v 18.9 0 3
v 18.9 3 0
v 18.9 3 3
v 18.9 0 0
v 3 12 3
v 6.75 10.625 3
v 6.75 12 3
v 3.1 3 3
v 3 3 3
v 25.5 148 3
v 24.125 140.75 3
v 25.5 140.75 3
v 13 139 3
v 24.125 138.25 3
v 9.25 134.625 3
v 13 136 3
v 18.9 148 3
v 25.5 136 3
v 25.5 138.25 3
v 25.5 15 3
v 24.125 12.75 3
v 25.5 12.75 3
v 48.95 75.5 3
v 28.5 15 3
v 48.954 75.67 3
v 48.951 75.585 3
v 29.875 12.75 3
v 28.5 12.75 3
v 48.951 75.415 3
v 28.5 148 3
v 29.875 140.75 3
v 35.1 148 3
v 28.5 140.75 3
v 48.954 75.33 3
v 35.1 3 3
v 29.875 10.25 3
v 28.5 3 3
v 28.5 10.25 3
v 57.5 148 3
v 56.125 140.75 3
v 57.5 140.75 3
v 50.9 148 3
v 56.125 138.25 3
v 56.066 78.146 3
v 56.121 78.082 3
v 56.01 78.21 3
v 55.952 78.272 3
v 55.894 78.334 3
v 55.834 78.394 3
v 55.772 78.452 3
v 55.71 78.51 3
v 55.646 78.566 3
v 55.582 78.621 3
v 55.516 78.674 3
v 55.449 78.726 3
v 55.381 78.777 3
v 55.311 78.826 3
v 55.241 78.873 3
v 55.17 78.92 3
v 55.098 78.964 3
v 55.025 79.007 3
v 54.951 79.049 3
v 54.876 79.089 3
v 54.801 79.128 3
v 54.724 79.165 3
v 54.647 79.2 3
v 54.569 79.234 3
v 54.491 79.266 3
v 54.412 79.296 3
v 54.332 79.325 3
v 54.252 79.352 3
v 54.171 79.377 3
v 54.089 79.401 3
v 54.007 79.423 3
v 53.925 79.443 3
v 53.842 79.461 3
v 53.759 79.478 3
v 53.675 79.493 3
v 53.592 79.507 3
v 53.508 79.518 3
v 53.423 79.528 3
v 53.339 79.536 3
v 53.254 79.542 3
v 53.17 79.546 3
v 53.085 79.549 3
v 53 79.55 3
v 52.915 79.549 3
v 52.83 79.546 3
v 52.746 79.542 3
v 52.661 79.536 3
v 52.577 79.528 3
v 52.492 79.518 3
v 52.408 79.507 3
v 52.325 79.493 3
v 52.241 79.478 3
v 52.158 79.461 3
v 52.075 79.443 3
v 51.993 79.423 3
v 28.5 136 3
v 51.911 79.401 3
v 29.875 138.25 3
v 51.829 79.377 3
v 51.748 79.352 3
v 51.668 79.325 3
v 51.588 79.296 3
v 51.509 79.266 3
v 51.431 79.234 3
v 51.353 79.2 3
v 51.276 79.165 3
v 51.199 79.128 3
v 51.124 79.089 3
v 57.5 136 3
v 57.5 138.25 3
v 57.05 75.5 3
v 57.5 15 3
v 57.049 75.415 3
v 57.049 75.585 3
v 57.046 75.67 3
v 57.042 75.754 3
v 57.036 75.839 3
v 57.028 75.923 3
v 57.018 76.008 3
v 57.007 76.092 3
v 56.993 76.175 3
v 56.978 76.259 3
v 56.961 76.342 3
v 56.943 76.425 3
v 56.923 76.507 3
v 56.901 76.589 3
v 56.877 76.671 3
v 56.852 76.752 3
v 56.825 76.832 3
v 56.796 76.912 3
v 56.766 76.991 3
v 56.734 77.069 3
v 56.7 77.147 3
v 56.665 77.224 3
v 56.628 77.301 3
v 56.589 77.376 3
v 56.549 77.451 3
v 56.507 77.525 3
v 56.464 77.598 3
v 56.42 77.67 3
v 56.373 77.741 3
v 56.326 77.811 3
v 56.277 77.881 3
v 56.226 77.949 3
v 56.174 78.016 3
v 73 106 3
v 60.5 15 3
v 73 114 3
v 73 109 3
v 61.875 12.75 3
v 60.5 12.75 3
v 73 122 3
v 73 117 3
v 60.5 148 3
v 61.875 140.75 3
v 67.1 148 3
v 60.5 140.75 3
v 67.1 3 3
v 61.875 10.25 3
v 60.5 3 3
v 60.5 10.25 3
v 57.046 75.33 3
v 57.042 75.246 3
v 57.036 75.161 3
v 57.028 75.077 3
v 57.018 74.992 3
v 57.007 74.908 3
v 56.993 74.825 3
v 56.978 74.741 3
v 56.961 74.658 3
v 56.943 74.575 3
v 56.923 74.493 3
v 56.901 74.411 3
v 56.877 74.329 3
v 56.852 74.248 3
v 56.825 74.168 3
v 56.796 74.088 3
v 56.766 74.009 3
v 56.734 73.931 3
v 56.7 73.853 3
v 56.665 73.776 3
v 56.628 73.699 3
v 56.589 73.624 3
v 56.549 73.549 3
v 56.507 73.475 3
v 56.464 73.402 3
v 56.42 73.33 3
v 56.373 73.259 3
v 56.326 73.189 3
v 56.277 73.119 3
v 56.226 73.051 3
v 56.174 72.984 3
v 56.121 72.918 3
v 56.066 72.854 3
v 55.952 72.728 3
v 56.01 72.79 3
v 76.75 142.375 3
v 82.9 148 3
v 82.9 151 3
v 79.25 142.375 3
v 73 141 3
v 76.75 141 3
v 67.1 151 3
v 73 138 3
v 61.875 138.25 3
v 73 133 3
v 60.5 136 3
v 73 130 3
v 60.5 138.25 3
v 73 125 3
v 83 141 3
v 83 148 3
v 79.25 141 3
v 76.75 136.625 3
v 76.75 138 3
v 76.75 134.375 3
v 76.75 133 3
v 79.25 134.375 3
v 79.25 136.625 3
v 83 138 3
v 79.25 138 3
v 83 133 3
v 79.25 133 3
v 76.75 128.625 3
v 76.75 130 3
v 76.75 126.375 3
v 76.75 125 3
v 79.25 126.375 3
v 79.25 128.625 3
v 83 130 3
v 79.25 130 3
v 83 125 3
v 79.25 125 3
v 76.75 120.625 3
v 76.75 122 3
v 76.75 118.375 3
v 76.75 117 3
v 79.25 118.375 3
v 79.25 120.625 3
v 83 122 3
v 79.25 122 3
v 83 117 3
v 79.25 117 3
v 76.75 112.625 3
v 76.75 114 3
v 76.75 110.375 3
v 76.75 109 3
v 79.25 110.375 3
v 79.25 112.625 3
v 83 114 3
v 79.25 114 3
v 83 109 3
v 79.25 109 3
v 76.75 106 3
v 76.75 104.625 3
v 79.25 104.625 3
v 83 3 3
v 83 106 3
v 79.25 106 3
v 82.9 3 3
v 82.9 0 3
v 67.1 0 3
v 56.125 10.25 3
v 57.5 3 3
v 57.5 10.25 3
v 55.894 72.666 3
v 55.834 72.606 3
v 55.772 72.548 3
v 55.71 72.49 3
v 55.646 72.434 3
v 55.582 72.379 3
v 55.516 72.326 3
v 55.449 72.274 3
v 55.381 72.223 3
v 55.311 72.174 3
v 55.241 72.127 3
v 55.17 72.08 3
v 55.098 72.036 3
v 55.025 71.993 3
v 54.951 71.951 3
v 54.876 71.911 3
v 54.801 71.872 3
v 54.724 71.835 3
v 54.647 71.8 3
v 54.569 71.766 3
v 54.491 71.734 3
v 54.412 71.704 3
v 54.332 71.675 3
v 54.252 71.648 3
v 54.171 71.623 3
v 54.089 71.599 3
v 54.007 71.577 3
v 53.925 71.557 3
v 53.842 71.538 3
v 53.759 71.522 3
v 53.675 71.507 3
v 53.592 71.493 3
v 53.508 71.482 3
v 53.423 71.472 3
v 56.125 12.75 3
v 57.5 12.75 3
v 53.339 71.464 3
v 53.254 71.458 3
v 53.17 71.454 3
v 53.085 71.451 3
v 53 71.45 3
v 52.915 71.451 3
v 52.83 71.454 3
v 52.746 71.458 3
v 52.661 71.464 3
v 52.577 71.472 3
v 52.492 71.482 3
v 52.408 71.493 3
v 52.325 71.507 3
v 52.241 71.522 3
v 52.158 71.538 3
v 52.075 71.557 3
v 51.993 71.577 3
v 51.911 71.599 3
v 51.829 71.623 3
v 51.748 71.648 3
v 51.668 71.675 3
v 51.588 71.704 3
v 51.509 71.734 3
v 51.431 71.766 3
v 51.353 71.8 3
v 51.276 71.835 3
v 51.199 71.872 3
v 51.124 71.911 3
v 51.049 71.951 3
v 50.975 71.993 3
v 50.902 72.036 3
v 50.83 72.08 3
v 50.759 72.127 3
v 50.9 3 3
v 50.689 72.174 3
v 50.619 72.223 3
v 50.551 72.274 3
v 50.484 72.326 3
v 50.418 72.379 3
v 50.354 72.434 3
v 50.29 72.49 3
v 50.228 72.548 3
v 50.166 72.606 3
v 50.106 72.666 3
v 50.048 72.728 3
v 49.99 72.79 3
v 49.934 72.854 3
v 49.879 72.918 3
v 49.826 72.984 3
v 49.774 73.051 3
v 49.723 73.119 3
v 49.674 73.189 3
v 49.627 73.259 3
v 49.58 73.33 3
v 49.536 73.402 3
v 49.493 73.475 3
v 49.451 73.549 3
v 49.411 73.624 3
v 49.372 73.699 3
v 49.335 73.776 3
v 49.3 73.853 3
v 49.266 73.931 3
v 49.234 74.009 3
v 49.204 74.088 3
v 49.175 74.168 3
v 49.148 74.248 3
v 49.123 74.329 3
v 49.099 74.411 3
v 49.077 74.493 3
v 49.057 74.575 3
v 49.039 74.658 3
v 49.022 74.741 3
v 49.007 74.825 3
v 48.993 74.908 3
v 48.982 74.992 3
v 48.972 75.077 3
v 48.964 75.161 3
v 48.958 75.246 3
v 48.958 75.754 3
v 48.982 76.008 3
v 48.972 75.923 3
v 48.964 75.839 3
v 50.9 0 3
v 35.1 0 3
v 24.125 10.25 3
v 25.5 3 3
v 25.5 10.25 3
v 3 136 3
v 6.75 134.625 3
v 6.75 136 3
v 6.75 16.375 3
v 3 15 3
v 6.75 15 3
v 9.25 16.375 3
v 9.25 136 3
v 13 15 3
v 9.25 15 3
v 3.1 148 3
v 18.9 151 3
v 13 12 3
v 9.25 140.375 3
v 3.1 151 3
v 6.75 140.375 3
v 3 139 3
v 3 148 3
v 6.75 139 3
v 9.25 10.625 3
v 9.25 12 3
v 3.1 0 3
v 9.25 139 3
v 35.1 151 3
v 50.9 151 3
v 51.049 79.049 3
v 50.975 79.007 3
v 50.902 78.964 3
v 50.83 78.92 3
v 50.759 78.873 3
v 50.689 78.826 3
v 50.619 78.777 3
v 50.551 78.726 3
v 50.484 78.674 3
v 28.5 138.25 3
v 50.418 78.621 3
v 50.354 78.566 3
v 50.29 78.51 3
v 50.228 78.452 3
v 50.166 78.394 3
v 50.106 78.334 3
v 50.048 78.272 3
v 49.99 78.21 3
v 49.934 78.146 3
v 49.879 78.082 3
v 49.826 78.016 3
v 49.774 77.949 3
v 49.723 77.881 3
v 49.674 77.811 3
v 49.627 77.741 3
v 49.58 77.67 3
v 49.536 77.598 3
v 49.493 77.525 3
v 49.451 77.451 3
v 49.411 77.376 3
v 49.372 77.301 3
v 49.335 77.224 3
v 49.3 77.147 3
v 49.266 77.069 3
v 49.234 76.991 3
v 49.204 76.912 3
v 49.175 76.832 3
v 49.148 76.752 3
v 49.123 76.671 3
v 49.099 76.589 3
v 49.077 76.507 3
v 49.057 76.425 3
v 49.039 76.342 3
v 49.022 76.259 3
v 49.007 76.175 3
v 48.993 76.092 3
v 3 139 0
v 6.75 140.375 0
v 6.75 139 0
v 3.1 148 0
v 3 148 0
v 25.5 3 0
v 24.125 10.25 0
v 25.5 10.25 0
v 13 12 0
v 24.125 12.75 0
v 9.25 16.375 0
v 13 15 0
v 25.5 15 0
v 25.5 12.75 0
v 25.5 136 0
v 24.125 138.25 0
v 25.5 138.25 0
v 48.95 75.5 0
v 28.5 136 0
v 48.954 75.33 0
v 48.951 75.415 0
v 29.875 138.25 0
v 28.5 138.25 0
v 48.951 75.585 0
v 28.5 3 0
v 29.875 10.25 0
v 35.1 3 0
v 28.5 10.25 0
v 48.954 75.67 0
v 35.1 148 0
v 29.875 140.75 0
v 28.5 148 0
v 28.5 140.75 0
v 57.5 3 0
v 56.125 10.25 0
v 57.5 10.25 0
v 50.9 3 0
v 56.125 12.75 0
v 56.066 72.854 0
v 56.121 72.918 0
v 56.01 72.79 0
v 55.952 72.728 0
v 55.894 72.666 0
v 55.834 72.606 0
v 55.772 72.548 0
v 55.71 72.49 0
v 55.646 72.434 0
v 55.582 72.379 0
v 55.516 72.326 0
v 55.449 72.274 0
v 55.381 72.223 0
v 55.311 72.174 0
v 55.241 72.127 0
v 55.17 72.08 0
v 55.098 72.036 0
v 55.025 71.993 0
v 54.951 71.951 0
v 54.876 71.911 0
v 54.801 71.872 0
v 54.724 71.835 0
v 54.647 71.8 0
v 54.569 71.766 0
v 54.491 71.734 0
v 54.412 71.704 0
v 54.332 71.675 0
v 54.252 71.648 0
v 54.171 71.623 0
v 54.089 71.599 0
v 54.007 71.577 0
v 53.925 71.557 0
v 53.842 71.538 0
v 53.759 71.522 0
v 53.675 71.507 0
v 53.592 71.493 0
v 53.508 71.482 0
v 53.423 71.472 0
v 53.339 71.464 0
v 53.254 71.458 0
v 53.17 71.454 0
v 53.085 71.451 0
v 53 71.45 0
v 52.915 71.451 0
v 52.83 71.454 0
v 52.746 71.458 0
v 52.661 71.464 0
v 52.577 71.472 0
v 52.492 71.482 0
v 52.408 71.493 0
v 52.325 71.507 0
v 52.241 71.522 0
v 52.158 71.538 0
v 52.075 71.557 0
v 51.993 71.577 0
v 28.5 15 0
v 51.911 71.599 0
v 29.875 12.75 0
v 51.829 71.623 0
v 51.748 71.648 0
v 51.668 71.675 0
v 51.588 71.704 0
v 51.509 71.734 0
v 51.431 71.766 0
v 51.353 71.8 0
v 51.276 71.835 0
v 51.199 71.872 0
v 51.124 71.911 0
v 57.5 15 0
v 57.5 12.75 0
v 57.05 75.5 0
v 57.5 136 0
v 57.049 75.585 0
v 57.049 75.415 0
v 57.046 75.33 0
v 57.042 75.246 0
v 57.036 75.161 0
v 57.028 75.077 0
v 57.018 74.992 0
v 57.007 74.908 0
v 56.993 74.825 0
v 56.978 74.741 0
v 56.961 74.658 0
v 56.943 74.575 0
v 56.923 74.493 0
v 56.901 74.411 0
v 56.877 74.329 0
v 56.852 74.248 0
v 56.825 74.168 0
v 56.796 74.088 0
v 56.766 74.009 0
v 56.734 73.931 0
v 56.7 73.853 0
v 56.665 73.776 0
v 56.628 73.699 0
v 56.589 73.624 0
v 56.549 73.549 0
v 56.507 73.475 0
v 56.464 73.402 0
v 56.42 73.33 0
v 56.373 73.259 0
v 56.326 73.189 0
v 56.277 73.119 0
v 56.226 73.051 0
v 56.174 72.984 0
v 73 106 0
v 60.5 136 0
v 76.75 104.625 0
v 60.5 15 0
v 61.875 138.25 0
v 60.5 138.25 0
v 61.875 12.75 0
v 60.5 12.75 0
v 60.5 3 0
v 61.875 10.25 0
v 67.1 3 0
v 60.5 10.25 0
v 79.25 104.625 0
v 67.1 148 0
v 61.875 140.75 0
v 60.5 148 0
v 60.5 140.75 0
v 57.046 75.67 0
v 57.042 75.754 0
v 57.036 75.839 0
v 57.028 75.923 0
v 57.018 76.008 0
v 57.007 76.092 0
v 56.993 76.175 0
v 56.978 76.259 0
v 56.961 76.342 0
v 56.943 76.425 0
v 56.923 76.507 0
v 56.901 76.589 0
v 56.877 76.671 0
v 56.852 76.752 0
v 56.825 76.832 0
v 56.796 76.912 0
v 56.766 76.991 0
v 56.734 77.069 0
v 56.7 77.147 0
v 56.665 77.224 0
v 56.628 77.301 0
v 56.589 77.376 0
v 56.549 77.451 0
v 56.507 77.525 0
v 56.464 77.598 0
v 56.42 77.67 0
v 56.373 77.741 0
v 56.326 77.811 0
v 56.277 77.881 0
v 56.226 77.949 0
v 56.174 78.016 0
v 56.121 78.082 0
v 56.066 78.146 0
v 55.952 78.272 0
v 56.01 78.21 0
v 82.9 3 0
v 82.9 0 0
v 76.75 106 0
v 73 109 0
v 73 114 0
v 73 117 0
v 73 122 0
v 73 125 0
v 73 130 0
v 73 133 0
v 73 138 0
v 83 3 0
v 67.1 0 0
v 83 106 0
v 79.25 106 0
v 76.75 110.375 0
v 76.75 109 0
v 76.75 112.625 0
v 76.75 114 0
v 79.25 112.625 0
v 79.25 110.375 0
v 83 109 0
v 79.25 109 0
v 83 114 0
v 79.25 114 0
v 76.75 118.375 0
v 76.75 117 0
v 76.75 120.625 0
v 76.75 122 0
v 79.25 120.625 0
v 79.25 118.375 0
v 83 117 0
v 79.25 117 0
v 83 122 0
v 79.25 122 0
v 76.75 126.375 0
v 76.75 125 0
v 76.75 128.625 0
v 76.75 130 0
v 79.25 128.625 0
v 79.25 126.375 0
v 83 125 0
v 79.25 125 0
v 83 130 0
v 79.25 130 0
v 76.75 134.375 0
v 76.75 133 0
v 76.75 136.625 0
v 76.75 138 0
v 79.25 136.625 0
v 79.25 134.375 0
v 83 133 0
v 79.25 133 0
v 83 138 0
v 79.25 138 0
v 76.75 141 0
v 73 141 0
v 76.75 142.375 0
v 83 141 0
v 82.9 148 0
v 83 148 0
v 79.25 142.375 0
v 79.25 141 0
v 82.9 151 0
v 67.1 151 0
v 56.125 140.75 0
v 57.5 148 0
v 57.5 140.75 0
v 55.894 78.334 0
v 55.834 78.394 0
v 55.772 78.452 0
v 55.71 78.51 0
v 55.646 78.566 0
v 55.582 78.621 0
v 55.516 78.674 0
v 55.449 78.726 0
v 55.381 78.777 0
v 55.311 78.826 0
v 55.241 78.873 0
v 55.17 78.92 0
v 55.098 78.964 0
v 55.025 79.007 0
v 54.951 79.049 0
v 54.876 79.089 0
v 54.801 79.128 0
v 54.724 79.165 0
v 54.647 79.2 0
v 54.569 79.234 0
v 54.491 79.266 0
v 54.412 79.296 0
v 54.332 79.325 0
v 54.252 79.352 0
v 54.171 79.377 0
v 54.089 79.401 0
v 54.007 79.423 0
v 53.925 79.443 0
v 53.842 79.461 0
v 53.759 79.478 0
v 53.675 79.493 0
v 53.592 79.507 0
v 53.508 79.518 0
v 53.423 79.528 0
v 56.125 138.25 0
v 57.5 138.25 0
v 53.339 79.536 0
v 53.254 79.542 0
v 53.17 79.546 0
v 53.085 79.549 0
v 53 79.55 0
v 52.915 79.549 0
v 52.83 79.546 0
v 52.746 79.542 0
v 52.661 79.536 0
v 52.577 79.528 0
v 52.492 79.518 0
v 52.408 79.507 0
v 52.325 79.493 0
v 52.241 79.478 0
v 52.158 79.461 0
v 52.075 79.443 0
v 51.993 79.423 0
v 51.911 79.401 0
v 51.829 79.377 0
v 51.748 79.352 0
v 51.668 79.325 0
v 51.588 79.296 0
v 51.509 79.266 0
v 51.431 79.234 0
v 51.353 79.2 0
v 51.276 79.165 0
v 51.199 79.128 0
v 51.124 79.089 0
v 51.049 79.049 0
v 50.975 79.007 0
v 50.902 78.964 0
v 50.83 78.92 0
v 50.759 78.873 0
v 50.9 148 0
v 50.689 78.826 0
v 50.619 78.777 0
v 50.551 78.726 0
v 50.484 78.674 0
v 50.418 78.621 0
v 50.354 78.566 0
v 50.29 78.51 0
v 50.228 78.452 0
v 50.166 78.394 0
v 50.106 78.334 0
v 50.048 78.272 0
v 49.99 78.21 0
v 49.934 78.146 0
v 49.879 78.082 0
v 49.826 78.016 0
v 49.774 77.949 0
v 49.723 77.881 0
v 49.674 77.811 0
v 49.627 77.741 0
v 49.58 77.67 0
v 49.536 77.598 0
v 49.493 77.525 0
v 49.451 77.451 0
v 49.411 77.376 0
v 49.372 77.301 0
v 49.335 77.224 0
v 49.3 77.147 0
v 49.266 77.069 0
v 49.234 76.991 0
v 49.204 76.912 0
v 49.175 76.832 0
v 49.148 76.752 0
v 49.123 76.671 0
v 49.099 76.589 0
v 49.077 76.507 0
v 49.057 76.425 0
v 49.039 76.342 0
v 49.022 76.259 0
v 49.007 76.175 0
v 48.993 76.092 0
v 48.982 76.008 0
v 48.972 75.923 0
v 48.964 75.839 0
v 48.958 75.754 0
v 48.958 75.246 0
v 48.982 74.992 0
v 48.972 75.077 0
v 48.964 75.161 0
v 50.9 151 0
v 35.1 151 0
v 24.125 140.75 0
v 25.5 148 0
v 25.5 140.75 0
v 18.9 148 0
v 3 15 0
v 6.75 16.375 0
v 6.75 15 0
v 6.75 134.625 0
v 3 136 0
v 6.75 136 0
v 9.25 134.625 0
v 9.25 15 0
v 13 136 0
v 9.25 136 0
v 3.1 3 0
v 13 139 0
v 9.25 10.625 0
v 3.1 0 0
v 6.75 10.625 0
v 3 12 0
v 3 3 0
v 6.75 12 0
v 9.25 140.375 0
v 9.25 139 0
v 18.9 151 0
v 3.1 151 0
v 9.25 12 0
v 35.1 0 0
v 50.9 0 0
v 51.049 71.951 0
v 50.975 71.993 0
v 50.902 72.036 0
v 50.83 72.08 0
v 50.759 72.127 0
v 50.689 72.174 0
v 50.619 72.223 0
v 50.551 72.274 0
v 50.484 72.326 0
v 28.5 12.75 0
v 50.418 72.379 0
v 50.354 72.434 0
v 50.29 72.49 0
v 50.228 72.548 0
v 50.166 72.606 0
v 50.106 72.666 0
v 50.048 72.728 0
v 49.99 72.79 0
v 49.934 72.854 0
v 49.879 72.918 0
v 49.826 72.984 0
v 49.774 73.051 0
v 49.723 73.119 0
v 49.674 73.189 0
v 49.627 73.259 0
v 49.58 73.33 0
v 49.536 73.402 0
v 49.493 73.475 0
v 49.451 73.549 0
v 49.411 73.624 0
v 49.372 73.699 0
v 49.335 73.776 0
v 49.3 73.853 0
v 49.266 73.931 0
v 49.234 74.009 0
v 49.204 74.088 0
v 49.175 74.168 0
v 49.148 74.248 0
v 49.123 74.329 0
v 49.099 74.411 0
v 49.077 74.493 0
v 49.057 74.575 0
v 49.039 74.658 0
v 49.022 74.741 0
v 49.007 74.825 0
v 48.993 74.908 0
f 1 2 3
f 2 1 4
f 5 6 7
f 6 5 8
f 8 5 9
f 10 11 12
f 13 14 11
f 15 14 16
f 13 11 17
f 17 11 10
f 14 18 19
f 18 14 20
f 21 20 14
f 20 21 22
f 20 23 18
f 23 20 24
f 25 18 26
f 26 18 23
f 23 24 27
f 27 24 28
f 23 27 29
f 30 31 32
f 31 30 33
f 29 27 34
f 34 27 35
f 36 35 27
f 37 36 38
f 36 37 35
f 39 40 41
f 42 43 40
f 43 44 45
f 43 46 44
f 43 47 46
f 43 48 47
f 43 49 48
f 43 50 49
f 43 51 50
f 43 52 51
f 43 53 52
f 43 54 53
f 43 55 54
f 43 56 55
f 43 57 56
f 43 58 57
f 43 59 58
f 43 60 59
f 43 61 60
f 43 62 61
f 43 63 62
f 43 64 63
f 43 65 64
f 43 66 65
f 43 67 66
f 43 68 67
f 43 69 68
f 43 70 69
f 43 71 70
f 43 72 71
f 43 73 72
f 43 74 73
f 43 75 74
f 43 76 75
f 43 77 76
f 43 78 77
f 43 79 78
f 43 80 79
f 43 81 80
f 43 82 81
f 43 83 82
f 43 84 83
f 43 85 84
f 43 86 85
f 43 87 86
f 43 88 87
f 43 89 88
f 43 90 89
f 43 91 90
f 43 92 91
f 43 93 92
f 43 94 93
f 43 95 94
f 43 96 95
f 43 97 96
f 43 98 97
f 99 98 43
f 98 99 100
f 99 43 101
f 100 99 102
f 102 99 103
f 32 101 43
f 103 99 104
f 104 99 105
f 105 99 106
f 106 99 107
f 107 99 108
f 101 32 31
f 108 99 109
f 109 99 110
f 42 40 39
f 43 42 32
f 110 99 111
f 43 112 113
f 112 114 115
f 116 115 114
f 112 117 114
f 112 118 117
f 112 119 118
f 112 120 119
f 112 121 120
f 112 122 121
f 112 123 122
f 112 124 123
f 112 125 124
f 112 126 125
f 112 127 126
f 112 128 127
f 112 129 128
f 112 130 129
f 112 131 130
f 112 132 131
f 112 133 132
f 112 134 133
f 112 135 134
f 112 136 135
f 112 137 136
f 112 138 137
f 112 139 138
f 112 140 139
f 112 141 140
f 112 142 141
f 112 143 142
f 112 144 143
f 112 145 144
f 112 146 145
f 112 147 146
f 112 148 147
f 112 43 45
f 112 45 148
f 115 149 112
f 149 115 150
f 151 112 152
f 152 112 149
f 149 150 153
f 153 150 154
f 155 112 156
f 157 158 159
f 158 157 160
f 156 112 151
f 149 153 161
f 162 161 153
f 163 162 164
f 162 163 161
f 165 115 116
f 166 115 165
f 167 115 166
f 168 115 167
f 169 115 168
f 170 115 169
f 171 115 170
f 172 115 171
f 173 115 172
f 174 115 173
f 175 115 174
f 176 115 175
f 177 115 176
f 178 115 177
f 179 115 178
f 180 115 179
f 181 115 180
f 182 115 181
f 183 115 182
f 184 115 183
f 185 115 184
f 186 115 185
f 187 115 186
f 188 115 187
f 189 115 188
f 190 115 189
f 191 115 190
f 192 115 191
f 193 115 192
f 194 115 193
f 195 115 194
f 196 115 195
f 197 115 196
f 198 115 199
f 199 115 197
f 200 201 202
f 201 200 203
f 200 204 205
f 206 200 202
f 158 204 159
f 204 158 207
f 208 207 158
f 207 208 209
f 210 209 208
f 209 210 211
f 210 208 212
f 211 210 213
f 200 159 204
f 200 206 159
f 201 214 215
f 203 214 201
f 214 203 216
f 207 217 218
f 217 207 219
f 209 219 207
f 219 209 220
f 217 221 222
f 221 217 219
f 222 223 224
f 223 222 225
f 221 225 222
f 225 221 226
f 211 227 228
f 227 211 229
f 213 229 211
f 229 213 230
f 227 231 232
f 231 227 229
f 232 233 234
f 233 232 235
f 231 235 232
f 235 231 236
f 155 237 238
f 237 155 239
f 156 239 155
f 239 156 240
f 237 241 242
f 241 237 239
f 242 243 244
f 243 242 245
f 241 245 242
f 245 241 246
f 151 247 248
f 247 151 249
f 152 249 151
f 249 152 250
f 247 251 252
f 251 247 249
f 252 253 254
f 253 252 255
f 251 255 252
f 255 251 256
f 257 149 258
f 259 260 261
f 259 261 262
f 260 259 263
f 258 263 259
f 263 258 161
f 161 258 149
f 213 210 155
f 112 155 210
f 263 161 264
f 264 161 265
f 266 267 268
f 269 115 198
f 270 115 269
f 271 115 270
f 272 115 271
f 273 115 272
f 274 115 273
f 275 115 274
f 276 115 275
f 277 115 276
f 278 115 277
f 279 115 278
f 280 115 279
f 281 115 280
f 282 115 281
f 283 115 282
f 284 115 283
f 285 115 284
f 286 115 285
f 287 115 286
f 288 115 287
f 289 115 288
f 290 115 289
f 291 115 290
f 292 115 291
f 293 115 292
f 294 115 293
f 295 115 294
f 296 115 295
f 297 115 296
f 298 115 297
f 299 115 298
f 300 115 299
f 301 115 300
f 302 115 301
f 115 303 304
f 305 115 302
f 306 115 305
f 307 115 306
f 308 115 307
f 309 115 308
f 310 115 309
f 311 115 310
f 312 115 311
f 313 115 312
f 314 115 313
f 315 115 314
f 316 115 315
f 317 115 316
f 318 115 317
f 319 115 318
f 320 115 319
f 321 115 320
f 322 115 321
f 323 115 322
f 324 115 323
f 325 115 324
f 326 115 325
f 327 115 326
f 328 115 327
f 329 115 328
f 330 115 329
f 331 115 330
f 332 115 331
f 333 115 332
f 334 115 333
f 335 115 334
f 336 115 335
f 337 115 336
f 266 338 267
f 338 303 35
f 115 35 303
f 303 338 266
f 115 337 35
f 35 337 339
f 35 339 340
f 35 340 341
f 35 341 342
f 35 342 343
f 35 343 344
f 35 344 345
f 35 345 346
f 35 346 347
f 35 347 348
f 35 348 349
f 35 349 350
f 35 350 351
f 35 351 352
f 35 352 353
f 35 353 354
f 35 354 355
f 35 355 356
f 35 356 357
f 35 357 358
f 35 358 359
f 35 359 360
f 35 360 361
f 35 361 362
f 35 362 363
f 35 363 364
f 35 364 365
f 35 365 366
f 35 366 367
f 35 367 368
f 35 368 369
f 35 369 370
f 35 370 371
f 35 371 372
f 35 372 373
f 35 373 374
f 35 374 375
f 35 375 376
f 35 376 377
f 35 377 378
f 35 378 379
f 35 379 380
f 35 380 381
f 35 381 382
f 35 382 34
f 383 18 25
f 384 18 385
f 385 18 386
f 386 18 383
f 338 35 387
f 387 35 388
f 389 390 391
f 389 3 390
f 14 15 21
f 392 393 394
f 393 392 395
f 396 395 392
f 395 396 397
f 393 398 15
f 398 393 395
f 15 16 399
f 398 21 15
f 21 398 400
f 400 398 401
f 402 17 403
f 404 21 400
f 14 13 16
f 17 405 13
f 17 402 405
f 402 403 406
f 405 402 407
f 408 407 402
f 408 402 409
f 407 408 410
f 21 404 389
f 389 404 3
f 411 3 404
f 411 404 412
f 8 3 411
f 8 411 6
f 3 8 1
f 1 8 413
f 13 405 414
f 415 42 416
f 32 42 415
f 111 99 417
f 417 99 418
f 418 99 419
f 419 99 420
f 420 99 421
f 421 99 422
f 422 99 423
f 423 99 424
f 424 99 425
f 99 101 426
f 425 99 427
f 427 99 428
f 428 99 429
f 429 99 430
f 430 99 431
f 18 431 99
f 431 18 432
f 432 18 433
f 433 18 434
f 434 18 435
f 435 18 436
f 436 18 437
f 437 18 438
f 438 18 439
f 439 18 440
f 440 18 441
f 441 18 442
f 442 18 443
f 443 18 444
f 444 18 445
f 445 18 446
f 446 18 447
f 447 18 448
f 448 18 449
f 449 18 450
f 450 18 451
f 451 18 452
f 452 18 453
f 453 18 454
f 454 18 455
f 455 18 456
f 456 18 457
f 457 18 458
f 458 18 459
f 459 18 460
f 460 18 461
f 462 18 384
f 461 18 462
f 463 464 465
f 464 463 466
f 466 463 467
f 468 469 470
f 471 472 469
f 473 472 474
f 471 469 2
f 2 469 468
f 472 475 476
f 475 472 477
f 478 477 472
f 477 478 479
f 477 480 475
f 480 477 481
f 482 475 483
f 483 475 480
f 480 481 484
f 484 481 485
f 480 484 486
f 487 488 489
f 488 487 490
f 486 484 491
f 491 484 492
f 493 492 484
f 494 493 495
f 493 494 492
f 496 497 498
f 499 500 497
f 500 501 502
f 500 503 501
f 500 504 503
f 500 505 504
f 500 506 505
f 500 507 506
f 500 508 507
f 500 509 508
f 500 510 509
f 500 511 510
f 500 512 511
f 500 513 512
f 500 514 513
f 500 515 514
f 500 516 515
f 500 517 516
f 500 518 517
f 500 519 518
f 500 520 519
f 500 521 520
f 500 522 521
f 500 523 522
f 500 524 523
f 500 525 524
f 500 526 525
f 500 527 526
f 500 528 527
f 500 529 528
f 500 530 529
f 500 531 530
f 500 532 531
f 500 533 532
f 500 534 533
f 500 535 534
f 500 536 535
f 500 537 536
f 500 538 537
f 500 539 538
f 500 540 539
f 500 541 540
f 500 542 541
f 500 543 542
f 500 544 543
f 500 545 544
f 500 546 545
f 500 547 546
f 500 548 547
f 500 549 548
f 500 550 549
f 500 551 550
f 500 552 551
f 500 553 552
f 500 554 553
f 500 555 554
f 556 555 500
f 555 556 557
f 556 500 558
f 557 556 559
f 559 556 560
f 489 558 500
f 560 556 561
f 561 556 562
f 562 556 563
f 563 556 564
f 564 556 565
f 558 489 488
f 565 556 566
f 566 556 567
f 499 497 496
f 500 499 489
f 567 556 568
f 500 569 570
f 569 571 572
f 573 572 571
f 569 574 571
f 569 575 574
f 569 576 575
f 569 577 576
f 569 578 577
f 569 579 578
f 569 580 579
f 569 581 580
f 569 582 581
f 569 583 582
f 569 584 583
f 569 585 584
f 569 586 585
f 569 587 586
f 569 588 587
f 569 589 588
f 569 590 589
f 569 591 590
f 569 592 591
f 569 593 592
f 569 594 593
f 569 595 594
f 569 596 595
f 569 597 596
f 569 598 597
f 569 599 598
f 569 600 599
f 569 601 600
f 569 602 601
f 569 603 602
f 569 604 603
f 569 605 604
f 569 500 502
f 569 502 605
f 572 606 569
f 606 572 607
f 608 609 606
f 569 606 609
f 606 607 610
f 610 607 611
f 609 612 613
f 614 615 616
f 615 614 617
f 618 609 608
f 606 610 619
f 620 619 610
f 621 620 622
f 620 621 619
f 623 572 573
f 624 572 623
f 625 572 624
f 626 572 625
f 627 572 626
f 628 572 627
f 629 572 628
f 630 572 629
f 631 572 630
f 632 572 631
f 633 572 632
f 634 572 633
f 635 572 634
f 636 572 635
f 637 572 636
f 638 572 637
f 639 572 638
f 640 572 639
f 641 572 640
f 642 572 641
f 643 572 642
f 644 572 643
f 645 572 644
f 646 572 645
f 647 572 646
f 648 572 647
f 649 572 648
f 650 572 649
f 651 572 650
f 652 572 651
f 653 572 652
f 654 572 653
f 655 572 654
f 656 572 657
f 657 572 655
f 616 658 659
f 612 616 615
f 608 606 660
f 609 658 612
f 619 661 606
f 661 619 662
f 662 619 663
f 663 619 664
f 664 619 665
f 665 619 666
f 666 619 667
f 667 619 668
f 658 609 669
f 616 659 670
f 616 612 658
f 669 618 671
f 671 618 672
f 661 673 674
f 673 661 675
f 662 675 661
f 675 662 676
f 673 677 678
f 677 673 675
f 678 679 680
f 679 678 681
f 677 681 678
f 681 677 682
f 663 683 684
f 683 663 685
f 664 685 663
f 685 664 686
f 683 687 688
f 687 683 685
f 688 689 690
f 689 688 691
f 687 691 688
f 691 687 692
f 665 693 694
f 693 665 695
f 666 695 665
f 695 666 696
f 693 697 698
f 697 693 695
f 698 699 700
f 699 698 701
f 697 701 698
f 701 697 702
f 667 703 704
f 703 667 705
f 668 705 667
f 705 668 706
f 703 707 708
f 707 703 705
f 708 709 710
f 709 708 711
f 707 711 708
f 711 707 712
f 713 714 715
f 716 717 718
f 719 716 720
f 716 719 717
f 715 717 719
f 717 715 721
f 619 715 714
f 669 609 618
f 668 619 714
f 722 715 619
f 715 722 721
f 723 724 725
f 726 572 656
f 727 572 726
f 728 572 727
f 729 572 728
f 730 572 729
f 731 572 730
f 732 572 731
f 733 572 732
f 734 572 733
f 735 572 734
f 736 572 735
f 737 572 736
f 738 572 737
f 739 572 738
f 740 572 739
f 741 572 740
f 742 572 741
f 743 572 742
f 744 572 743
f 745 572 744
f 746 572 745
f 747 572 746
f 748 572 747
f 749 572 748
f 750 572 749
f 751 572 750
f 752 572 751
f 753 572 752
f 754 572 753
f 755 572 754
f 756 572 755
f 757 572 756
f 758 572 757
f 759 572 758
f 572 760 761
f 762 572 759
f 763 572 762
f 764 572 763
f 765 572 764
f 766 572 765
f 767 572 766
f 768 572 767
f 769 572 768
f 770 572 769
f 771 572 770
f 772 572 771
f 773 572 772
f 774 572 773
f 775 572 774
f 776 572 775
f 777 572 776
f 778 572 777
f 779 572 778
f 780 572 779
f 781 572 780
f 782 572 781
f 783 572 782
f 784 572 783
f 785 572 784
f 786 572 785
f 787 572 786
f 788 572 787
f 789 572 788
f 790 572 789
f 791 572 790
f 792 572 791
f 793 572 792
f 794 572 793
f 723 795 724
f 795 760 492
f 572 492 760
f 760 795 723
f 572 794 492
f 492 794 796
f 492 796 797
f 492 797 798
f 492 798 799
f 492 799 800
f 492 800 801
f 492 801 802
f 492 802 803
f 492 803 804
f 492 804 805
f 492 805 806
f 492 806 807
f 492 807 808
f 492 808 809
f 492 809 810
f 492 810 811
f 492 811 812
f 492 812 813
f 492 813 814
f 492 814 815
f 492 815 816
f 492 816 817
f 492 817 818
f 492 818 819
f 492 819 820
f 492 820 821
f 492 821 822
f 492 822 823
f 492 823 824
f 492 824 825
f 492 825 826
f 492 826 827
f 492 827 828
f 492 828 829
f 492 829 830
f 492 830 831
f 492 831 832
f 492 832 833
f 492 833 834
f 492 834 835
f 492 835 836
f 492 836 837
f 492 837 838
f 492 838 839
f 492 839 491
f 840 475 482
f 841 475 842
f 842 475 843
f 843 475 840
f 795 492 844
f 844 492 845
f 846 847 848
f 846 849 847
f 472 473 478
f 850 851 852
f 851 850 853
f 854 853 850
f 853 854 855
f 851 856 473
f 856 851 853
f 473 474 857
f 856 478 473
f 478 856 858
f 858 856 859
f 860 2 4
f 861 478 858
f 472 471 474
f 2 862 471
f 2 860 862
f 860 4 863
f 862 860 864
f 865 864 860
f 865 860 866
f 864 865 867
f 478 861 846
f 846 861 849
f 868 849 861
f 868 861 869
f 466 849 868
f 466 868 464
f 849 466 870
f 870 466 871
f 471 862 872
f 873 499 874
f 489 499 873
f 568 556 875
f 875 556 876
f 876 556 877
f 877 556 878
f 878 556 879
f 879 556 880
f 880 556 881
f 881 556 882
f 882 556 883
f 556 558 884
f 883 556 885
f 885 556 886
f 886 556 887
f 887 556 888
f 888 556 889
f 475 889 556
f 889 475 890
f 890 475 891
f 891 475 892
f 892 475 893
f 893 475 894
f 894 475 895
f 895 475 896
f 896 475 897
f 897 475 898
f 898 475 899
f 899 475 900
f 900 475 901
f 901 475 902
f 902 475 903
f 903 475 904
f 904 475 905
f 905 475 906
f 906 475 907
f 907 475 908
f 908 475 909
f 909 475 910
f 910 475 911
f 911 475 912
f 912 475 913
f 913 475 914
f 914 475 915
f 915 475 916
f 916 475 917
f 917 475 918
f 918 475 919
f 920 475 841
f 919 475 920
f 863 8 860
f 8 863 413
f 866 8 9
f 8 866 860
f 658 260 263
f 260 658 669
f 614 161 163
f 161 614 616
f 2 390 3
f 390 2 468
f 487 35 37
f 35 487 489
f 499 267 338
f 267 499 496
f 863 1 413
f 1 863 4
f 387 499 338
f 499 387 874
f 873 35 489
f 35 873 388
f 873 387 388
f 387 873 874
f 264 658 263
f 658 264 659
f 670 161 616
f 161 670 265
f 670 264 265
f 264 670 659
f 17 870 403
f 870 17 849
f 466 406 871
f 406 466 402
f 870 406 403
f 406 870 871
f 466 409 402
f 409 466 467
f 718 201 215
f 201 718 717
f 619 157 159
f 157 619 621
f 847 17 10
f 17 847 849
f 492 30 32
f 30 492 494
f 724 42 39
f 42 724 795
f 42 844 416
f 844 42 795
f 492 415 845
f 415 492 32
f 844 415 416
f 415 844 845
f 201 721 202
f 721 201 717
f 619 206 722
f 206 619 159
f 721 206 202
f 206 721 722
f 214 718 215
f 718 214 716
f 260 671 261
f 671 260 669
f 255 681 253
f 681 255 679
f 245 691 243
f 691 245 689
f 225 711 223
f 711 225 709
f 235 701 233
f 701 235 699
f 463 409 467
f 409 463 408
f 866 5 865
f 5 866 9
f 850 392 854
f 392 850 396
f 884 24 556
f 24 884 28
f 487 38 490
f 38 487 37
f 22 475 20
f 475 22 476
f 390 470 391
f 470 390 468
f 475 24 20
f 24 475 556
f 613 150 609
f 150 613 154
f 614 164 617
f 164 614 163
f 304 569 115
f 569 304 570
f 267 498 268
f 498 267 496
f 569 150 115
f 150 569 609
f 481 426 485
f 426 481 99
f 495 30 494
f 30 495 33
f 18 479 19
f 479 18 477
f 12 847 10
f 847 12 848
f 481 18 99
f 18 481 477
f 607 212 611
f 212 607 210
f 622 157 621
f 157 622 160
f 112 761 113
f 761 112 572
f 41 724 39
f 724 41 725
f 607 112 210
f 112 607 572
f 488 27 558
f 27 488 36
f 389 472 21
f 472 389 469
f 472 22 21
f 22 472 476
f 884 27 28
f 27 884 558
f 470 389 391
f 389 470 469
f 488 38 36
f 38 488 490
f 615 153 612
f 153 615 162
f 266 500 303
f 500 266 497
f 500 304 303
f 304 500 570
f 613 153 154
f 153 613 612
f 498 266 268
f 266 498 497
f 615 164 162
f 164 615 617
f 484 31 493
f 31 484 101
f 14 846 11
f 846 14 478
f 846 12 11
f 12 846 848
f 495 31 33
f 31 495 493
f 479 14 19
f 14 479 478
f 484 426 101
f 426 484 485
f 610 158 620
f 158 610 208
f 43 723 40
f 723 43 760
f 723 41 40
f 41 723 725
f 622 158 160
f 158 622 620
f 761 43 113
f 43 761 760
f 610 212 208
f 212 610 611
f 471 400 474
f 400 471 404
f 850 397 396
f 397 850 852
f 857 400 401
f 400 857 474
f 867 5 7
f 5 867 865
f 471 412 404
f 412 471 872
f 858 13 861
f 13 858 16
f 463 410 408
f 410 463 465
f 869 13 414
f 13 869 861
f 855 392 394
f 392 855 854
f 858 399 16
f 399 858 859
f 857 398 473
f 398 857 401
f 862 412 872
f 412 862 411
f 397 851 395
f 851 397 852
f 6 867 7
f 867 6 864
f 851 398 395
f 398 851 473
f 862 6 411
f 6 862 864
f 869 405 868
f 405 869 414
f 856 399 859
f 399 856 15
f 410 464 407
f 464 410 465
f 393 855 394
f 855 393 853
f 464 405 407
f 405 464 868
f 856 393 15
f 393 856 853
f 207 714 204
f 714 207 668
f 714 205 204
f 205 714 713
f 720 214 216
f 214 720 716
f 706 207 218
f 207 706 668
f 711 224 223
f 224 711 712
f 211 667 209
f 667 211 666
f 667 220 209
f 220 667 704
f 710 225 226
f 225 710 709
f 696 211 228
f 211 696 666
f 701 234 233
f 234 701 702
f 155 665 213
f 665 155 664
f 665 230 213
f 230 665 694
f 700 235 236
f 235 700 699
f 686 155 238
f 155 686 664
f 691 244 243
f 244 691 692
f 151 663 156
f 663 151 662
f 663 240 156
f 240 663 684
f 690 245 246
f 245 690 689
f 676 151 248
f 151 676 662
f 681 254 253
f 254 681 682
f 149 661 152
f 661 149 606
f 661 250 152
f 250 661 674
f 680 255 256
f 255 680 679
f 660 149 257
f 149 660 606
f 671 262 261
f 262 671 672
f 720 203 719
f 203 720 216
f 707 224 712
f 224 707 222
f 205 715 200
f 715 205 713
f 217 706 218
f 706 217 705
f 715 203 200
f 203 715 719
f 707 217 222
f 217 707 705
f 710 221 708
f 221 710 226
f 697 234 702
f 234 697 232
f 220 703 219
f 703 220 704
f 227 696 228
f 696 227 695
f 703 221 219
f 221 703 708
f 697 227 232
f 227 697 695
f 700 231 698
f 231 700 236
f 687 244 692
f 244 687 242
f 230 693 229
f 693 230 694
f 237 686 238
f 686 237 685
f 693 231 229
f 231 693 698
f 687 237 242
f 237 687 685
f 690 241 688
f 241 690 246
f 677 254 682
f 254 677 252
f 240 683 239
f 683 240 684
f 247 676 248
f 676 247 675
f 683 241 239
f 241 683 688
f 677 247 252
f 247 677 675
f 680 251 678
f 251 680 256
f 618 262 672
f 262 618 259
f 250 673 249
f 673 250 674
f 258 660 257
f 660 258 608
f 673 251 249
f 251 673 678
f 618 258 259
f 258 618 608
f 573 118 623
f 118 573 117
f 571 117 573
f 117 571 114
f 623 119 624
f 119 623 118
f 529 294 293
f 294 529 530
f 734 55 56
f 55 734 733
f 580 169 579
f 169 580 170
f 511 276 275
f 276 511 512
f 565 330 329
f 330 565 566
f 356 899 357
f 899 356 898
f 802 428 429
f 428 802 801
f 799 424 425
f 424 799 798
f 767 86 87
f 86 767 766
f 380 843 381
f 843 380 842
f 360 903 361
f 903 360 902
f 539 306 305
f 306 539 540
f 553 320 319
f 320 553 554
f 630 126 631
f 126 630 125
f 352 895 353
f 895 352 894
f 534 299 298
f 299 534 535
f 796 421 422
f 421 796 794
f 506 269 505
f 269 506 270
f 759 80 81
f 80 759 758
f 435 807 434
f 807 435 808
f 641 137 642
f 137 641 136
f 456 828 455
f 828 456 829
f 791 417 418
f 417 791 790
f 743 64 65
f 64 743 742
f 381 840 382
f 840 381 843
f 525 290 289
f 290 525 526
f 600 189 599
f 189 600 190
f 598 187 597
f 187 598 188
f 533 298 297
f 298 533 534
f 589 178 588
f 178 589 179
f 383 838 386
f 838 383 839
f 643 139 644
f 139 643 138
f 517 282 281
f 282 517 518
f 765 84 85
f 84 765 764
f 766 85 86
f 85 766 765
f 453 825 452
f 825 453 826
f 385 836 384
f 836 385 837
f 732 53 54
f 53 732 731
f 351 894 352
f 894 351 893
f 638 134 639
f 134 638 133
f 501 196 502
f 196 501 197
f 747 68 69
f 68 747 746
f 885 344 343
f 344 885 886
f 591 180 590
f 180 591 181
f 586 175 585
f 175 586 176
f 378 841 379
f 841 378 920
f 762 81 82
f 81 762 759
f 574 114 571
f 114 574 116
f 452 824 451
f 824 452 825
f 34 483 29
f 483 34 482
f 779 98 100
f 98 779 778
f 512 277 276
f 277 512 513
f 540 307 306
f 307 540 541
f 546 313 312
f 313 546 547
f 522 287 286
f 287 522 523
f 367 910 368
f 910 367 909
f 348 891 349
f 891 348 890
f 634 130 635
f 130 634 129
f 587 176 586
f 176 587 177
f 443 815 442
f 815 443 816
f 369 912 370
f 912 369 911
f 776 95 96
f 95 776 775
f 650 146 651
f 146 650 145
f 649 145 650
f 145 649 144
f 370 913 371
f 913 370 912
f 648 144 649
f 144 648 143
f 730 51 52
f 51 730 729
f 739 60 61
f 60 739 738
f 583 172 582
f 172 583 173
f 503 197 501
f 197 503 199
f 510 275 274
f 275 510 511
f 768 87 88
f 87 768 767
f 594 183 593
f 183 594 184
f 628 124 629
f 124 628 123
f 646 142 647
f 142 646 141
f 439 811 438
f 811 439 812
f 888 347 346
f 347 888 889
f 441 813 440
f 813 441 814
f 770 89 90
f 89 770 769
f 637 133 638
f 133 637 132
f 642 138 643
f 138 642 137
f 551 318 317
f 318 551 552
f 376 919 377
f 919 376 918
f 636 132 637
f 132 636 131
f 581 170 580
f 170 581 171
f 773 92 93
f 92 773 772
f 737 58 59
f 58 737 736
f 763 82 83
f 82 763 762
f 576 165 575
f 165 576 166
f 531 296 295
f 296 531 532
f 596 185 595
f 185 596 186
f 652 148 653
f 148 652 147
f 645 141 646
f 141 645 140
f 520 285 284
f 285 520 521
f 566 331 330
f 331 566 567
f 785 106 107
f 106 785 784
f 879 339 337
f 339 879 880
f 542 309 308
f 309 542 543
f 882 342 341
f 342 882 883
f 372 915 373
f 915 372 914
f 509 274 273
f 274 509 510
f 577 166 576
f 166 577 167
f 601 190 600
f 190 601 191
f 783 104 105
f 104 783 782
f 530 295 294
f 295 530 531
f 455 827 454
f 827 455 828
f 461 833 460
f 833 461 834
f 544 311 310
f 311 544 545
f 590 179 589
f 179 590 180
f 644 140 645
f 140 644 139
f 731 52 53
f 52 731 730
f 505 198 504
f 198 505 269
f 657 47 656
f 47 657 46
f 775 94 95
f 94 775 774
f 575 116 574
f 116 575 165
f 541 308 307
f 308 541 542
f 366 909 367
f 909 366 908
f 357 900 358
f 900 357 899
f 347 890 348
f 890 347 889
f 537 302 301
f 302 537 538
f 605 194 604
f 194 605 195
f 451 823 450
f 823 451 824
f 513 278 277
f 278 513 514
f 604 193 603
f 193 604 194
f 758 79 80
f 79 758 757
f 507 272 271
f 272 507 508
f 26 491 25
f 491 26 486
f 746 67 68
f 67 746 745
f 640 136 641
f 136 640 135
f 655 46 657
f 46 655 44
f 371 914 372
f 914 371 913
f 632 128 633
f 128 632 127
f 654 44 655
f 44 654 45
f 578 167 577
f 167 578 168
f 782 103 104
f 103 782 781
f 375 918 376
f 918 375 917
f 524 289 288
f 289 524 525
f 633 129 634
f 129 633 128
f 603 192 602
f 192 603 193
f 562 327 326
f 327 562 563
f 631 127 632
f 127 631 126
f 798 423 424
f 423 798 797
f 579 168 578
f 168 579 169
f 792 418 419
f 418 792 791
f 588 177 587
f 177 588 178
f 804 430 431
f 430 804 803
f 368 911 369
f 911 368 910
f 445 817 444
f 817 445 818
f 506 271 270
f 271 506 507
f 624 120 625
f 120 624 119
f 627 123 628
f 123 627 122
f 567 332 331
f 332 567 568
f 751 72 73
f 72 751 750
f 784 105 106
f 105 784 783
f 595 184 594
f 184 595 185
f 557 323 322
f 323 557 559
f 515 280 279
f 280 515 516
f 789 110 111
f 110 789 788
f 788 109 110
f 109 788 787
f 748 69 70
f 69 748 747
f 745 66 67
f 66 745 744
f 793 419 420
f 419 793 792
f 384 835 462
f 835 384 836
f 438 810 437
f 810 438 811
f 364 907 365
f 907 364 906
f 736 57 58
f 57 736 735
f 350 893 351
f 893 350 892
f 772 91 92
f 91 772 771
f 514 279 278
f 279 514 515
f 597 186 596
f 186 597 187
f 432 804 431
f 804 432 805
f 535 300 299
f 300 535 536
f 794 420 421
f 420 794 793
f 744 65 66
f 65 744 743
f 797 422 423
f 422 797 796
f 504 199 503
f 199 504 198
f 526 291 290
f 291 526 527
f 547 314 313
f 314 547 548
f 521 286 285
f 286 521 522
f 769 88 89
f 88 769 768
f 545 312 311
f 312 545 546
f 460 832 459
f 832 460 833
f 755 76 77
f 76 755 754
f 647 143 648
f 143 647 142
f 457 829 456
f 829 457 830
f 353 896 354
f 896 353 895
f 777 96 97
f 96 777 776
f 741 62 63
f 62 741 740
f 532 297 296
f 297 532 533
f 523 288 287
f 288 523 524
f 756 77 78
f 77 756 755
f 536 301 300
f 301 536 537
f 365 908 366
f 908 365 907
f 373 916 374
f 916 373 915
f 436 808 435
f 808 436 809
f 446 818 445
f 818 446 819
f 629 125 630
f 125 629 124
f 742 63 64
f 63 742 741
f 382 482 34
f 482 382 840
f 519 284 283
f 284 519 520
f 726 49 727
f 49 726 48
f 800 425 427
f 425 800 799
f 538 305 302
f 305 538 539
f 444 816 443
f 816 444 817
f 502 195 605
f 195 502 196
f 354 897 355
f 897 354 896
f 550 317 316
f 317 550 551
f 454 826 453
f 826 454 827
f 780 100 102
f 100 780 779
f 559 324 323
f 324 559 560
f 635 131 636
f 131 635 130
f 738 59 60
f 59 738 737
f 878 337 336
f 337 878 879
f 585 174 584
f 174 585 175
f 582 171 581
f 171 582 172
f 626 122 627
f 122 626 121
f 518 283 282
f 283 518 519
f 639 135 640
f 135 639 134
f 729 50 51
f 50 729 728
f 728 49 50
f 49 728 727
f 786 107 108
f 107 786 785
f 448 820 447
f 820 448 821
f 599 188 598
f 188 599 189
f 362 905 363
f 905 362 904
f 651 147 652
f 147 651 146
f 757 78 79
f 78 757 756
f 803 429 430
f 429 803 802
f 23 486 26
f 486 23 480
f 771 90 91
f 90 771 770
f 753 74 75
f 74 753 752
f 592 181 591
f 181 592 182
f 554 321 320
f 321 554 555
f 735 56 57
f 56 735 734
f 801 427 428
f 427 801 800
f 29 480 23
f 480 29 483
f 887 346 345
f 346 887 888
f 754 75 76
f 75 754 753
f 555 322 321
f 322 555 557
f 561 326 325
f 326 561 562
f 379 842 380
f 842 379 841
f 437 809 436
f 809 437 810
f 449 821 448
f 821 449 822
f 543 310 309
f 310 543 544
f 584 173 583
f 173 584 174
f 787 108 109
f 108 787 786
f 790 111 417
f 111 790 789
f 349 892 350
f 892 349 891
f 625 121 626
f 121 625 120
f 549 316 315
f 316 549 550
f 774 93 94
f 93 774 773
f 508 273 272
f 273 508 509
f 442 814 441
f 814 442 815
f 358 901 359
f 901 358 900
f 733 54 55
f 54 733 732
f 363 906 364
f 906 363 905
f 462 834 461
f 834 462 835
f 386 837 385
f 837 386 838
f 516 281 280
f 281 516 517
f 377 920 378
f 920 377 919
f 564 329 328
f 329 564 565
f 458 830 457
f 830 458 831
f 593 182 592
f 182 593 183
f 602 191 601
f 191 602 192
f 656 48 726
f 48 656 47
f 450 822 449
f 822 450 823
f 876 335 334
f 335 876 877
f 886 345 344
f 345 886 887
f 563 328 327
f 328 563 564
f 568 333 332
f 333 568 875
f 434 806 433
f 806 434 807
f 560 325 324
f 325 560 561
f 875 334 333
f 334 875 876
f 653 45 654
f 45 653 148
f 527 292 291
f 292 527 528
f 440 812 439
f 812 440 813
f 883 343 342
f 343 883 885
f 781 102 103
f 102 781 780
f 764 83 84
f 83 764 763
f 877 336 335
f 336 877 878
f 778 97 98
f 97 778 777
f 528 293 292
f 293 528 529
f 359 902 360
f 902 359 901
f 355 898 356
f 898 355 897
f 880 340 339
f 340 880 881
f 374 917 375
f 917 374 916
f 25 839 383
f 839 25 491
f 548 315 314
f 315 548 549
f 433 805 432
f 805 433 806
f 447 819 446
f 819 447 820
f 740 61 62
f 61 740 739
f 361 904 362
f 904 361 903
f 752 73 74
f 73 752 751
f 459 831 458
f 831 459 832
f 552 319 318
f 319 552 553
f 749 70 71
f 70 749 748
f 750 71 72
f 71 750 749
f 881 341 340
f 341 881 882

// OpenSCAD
lct = 3; // Laser Cut thickness
dim_x = 86;
dim_y =  151;//height was 166 before
t_length = 10;// length of t-slot screw
t_thick = 3;// diameter of t-slot screw
nut_dia = 5.75;// diameter of t-slot nut
nut_thick = 2.5;// thickness of t-slot nut
dia_c = 8.1; //diameter of center hole
rad_c = dia_c/2;

tol = .1; //teeth tolerance
bthp = 12;//back t hole position (here back is leftside)
fthp = 10;//fromt t hole position (here front is right side)
fth_sep =8; //front t hole separation

difference(){
union(){
translate([lct,lct,0])cube([dim_x-2*lct,dim_y-2*lct,lct]);//cuboid
for(x=[lct+tol:32:dim_x-2*lct])translate([x,0,0])cube([16-2*tol,lct,lct]);//teeth bottom
for(x=[lct+tol:32:dim_x-2*lct])translate([x,dim_y-lct,0])cube([16-2*tol,lct,lct]);//teeth top
}

union(){
for(x=[lct+16+((16-t_thick)/2),32 + lct+16+((16-t_thick)/2)])/*x  and 32+x*/translate([x,0,0])color("red")cube([t_thick,t_length+5/*new screw*/,lct]);//screw hole bottom
for(x=[lct+16+((16-t_thick)/2), 32 + lct+16+((16-t_thick)/2)])translate([x,dim_y-t_length-5/*new screw*/,0])color("red")cube([t_thick,t_length+5/*new screw*/,lct]);//screw hole top
    
for(x=[(lct+16+((16-t_thick)/2))/*dist bw O and screwhole*/-((nut_dia-t_thick)/2)/*dist diff screwhole & nuthole*/:32:dim_x])translate([x,lct+((t_length-lct-nut_thick)/2)+5/*new screw*/,0])cube([nut_dia,nut_thick,lct]);//nut hole bottom
for(x=[(lct+16+((16-t_thick)/2))/*dist bw O and screwhole*/-((nut_dia-t_thick)/2)/*dist diff screwhole & nuthole*/:32:dim_x])translate([x,dim_y-lct-((t_length-lct-nut_thick)/2)-nut_thick-5/*new screw*/,0])cube([nut_dia,nut_thick,lct]);//nut hole top
}

union(){
    for(y=[bthp,dim_y-bthp-t_thick])translate([lct/*lct added, change to 0 if required,tscrew will look small*/,y,0])cube([t_length,t_thick,lct]);//screwhole left side(back)
    for(y=[bthp-((nut_dia-t_thick)/2),dim_y-bthp-((nut_dia-t_thick)/2)-t_thick])translate([lct+((t_length-nut_thick)/2),y,0])cube([nut_thick,nut_dia,lct]);//nuthole left side(back)
    
    
    for(y=[dim_y-fthp-t_thick:-fth_sep:100])translate([dim_x-t_length-lct/*lct added*/,y,0])cube([t_length,t_thick,lct]);//screwhole right side(front)
    for(y=[dim_y-fthp-((nut_dia-t_thick)/2)-t_thick:-fth_sep:100])translate([dim_x-lct-((t_length-nut_thick)/2)-nut_thick,y,0])cube([nut_thick,nut_dia,lct]);//nuthole right side(front)
}

translate([10,0,0])/*move hole by 10mm*/union(){//center hole
translate([dim_x/2,dim_y/2,0])cylinder(lct,r1=rad_c,r2=rad_c,center=false,$fn=300);
}
}
